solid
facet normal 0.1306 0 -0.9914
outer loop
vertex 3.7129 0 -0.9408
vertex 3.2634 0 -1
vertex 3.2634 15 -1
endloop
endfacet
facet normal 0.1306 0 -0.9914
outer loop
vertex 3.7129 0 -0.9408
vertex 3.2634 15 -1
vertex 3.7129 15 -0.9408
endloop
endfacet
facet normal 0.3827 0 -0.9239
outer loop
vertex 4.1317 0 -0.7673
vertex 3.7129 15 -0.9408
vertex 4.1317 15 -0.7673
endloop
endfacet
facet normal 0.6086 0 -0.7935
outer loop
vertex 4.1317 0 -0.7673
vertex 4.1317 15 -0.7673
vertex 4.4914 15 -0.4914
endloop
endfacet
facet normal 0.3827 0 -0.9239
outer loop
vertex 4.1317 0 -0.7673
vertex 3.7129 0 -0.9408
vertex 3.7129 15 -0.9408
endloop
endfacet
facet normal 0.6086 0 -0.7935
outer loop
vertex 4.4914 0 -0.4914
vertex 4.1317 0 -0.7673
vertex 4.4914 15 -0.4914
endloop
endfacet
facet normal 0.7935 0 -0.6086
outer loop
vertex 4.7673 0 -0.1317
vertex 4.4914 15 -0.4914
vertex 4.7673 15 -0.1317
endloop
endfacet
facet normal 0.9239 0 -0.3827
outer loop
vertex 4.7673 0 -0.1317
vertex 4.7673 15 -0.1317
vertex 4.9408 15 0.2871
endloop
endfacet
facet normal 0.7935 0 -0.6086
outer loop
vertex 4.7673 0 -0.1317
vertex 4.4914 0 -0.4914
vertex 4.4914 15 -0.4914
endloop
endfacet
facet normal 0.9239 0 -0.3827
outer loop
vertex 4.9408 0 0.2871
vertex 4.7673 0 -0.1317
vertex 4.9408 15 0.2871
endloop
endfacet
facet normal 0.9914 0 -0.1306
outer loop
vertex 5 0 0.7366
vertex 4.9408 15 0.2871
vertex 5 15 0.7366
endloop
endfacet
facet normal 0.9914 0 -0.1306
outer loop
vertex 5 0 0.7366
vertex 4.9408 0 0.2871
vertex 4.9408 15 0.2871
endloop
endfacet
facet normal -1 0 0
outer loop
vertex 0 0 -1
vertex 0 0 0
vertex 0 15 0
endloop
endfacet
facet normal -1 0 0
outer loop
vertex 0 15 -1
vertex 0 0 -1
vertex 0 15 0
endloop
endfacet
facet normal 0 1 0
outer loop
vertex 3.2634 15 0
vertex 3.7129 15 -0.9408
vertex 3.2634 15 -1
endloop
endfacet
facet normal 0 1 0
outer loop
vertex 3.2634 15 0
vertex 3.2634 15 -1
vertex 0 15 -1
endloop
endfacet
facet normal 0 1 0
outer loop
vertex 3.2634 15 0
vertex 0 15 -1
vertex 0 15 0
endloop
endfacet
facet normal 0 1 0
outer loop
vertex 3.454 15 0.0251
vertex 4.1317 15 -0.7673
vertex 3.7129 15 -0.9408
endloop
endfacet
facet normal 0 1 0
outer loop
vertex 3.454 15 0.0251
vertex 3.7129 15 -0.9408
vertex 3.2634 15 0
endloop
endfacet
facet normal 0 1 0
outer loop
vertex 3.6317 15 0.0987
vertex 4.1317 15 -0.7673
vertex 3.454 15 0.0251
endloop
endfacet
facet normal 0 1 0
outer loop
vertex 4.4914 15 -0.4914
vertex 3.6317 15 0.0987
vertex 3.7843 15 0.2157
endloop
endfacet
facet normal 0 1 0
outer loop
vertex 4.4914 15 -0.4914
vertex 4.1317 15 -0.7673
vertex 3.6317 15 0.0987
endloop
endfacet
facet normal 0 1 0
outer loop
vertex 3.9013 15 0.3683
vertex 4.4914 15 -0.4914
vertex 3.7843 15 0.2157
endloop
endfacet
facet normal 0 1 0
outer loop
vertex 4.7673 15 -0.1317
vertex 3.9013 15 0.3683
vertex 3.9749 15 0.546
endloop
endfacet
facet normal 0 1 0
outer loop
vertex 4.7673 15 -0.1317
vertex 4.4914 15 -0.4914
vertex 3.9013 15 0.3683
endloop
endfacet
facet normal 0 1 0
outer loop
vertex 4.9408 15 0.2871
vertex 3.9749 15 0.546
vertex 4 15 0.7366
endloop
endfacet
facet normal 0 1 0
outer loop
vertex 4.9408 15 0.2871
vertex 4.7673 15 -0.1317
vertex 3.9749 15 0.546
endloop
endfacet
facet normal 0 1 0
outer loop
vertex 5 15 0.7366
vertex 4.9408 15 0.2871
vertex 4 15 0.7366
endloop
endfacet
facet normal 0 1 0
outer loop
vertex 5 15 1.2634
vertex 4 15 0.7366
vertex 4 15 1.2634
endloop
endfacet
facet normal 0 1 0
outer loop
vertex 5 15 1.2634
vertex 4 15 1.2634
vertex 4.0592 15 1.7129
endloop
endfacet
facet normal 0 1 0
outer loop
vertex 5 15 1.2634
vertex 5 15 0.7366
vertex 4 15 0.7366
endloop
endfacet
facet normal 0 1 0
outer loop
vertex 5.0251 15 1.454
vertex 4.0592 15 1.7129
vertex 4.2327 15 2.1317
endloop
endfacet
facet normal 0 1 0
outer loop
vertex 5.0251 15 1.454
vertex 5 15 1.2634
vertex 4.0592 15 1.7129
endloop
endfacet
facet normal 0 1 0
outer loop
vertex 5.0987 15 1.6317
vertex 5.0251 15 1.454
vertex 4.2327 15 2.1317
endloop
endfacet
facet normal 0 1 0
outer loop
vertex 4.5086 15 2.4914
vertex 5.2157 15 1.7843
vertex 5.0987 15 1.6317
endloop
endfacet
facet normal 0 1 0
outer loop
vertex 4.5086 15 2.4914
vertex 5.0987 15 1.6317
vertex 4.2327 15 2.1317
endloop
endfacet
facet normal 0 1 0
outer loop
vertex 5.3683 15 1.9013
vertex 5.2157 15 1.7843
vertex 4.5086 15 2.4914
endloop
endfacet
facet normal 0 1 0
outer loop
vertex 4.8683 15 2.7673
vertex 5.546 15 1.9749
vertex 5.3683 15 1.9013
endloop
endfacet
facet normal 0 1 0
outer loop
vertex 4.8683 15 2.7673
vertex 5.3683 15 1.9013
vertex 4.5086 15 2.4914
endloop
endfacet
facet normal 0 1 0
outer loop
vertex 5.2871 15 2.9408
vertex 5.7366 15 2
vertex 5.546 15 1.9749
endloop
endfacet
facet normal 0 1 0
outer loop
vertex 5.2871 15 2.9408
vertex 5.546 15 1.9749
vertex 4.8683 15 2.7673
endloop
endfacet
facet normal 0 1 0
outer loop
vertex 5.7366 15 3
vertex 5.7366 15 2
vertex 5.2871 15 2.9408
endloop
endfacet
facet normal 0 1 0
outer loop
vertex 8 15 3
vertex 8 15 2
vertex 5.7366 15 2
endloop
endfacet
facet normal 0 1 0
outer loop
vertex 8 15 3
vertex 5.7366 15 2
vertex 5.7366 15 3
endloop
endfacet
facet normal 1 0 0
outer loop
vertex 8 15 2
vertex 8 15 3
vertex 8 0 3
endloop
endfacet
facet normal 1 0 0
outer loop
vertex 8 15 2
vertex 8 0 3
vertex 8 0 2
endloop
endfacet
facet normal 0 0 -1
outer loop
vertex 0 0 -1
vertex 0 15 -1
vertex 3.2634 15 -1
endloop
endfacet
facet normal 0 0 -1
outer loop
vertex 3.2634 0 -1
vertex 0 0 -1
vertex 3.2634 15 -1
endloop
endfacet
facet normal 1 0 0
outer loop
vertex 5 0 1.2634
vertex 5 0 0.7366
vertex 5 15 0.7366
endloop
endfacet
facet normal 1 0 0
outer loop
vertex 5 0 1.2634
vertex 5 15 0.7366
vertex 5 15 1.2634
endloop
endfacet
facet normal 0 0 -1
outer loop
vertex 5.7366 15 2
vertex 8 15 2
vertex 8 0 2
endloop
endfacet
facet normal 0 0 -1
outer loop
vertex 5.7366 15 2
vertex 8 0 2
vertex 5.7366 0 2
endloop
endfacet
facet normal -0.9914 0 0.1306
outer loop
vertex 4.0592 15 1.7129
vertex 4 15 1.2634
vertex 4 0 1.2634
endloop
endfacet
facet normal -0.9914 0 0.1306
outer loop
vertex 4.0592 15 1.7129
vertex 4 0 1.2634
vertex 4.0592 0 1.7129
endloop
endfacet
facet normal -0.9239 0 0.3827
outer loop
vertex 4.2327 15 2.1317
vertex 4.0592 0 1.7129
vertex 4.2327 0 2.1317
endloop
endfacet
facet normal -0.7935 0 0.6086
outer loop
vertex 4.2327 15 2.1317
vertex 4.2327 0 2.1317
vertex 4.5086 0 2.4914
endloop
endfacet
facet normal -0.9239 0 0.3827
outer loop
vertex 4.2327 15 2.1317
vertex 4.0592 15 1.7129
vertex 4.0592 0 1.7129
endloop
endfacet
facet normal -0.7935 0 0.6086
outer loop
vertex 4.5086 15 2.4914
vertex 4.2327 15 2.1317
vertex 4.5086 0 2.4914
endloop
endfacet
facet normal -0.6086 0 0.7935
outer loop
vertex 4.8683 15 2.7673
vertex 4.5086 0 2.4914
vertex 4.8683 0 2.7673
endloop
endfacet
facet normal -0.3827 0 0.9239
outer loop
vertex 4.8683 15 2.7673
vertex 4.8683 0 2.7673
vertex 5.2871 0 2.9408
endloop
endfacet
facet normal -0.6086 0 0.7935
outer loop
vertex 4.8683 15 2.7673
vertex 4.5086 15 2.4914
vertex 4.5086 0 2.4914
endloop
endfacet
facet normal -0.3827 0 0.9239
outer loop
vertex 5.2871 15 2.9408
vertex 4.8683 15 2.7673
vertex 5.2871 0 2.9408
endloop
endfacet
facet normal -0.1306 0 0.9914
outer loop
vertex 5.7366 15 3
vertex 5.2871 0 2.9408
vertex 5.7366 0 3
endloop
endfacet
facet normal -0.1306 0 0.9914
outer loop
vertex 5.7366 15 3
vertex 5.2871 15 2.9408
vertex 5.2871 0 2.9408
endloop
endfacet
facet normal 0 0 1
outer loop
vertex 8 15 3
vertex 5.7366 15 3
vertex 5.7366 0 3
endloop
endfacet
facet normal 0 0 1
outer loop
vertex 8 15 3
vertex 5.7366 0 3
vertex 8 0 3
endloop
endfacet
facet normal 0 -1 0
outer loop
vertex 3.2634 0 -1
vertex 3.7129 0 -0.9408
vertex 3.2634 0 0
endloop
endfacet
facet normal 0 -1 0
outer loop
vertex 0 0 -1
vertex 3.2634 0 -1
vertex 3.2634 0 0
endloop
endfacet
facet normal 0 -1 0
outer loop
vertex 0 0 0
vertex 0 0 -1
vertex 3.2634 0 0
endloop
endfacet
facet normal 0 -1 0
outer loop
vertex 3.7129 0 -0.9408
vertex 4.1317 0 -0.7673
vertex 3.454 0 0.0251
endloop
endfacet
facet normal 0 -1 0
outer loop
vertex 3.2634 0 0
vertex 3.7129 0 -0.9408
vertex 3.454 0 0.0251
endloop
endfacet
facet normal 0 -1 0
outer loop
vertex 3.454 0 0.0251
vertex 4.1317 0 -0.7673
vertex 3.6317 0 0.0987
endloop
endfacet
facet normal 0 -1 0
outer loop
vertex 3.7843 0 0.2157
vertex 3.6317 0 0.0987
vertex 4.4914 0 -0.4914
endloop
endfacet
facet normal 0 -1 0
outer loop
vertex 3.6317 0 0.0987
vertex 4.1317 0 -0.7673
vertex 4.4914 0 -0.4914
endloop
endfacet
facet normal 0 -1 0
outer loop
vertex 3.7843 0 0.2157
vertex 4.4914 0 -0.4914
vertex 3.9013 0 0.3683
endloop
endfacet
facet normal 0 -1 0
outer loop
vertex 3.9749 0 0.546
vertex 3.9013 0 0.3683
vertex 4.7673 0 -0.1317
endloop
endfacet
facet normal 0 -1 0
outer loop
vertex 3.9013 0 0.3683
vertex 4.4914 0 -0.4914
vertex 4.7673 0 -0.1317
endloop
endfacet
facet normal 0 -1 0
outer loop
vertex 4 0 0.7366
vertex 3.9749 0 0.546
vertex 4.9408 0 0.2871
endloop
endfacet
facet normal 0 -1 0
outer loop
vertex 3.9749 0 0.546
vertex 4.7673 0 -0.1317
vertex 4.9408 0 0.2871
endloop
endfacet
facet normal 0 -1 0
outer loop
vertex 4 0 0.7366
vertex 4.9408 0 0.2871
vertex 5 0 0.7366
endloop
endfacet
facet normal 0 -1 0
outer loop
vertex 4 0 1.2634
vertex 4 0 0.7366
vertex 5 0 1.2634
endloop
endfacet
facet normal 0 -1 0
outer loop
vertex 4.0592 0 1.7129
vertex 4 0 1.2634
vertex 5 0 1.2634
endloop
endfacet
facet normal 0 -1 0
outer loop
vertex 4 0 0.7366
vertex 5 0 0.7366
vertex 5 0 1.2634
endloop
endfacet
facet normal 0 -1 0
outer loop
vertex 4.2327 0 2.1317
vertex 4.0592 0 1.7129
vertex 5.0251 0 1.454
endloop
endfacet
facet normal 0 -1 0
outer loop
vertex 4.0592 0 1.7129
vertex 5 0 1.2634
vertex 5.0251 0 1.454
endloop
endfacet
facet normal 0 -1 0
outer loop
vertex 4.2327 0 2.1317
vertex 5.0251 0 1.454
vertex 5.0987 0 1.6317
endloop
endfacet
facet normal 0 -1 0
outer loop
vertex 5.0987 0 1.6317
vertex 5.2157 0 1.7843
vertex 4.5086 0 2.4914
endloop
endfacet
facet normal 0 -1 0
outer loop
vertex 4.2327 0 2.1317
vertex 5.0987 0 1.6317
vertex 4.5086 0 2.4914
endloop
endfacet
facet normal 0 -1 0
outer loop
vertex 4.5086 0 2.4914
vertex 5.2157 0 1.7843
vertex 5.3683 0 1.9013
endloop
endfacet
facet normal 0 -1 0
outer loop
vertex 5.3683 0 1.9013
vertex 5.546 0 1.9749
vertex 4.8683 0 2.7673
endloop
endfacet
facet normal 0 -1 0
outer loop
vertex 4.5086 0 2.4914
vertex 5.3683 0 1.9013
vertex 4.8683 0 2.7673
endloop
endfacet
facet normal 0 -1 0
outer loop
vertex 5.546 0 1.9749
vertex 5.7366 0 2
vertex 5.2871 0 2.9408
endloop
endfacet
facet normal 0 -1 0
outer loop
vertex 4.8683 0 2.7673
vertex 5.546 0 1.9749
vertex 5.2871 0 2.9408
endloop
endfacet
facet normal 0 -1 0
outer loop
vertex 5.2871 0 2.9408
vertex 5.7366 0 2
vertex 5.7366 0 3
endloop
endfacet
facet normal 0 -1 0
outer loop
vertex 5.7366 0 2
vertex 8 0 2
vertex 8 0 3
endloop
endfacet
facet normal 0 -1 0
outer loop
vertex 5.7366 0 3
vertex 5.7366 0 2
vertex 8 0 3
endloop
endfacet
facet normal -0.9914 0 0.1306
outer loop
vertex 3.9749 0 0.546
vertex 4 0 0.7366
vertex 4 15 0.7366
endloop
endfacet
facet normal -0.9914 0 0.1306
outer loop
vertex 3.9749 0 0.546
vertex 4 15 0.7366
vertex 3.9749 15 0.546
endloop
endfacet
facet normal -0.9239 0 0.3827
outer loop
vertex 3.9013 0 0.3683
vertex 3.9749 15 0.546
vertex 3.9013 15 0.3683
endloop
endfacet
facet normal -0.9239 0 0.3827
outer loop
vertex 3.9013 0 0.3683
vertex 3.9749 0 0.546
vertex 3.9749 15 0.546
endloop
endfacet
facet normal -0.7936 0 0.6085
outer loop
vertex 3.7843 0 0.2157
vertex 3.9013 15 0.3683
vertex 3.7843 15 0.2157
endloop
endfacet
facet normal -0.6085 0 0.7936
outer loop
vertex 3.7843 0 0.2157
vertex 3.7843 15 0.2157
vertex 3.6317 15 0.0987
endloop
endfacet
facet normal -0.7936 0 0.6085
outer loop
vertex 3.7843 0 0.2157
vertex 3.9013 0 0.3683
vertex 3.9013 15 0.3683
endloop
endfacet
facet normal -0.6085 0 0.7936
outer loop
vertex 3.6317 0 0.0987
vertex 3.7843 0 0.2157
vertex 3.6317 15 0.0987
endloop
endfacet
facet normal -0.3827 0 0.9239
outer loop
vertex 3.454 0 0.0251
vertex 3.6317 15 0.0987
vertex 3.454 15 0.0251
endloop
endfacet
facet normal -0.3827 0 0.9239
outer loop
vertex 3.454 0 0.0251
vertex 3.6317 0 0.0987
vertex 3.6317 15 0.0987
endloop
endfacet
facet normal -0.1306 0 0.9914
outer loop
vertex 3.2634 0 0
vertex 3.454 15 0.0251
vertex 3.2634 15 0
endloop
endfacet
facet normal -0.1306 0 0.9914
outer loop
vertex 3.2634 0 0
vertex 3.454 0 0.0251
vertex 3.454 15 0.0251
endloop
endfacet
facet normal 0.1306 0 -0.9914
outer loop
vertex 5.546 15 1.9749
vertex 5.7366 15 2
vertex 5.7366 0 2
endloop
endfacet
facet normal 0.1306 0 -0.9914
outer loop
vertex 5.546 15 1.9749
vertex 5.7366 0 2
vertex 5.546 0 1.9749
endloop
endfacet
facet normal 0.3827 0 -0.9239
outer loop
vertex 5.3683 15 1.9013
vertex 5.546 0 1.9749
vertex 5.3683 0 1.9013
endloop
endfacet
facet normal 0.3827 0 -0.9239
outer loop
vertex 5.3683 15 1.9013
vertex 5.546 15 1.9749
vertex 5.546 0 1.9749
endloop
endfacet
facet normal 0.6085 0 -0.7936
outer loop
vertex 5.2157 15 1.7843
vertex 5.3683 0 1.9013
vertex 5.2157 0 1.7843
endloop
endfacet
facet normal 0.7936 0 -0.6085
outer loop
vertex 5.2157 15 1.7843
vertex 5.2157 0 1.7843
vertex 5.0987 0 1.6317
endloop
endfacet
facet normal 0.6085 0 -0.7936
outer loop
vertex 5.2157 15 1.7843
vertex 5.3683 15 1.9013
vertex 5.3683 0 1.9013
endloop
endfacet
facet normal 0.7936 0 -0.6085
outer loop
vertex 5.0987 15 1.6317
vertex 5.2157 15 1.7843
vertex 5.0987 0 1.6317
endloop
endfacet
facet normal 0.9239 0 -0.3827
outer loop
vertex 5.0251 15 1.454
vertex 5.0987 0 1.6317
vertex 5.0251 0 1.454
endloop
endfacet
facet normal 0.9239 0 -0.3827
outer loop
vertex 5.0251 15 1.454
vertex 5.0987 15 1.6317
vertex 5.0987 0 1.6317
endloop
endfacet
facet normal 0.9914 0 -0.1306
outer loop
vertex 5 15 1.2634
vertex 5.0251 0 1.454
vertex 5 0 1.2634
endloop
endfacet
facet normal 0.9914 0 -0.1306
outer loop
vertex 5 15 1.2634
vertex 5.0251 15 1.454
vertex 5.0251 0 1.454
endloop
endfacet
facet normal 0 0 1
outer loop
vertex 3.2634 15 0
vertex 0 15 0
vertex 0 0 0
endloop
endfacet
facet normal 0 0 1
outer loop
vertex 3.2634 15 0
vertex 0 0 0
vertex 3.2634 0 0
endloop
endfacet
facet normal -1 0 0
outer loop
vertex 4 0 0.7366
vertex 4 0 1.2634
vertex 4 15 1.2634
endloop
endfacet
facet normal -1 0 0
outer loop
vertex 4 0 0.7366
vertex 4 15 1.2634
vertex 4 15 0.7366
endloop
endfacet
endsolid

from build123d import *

# Parameters (mm, degrees)
SKETCH1_W                    = 4
SKETCH1_H                    = 15
BASE_FLANGE1_DEPTH           = 1
EDGE_FLANGE1_STRIP_W         = 5.4732
EDGE_FLANGE1_STRIP_H         = 1
EDGE_FLANGE1_STRIP_CUT_DEPTH = 15
EDGE_FLANGE1_DEPTH           = 15
EDGE_FLANGE2_STRIP_W         = 5.4732
EDGE_FLANGE2_STRIP_H         = 1
EDGE_FLANGE2_STRIP_CUT_DEPTH = 15
EDGE_FLANGE2_DEPTH           = 15


# Sheet-metal steps are written as plain solids
with BuildPart() as part:
    # Sketch1 → Base-Flange1 (new body)
    with BuildSketch(Plane.XY):
        with Locations((2, 7.5)):
            Rectangle(SKETCH1_W, SKETCH1_H)
    extrude(amount=-BASE_FLANGE1_DEPTH)

    # Edge-Flange1 strip (across the edge) → Edge-Flange1 strip cut (cut)
    with BuildSketch(Plane(origin=(4, 0, 0), x_dir=(-1, 0, 0), z_dir=(0, 1, 0))):
        with Locations((-2, -0.5)):
            Rectangle(EDGE_FLANGE1_STRIP_W, EDGE_FLANGE1_STRIP_H)
    extrude(amount=EDGE_FLANGE1_STRIP_CUT_DEPTH, mode=Mode.SUBTRACT)

    # Edge-Flange1 section (across the edge) → Edge-Flange1 (add)
    with BuildSketch(Plane(origin=(4, 0, 0), x_dir=(-1, 0, 0), z_dir=(0, 1, 0))):
        with BuildLine():
            Line((-1, 0.7366), (-1, 2))
            Line((-1, 2), (0, 2))
            Line((0, 2), (0, 0.7366))
            ThreePointArc((0, 0.7366), (0.215745145, 0.215745145), (0.7366, 0))
            Line((0.7366, 0), (0.7366, -1))
            ThreePointArc((0.7366, -1), (-0.491361636, -0.491361636), (-1, 0.7366))
        make_face()
    extrude(amount=EDGE_FLANGE1_DEPTH)

    # Edge-Flange2 strip (across the edge) → Edge-Flange2 strip cut (cut)
    with BuildSketch(Plane(origin=(5, 15, 2), x_dir=(0, 0, -1), z_dir=(0, -1, 0))):
        with Locations((-2, -0.5)):
            Rectangle(EDGE_FLANGE2_STRIP_W, EDGE_FLANGE2_STRIP_H)
    extrude(amount=EDGE_FLANGE2_STRIP_CUT_DEPTH, mode=Mode.SUBTRACT)

    # Edge-Flange2 section (across the edge) → Edge-Flange2 (add)
    with BuildSketch(Plane(origin=(5, 15, 2), x_dir=(0, 0, -1), z_dir=(0, -1, 0))):
        with BuildLine():
            Line((-1, 0.7366), (-1, 3))
            Line((-1, 3), (0, 3))
            Line((0, 3), (0, 0.7366))
            ThreePointArc((0, 0.7366), (0.215745145, 0.215745145), (0.7366, 0))
            Line((0.7366, 0), (0.7366, -1))
            ThreePointArc((0.7366, -1), (-0.491361636, -0.491361636), (-1, 0.7366))
        make_face()
    extrude(amount=EDGE_FLANGE2_DEPTH)


solid = part.part
